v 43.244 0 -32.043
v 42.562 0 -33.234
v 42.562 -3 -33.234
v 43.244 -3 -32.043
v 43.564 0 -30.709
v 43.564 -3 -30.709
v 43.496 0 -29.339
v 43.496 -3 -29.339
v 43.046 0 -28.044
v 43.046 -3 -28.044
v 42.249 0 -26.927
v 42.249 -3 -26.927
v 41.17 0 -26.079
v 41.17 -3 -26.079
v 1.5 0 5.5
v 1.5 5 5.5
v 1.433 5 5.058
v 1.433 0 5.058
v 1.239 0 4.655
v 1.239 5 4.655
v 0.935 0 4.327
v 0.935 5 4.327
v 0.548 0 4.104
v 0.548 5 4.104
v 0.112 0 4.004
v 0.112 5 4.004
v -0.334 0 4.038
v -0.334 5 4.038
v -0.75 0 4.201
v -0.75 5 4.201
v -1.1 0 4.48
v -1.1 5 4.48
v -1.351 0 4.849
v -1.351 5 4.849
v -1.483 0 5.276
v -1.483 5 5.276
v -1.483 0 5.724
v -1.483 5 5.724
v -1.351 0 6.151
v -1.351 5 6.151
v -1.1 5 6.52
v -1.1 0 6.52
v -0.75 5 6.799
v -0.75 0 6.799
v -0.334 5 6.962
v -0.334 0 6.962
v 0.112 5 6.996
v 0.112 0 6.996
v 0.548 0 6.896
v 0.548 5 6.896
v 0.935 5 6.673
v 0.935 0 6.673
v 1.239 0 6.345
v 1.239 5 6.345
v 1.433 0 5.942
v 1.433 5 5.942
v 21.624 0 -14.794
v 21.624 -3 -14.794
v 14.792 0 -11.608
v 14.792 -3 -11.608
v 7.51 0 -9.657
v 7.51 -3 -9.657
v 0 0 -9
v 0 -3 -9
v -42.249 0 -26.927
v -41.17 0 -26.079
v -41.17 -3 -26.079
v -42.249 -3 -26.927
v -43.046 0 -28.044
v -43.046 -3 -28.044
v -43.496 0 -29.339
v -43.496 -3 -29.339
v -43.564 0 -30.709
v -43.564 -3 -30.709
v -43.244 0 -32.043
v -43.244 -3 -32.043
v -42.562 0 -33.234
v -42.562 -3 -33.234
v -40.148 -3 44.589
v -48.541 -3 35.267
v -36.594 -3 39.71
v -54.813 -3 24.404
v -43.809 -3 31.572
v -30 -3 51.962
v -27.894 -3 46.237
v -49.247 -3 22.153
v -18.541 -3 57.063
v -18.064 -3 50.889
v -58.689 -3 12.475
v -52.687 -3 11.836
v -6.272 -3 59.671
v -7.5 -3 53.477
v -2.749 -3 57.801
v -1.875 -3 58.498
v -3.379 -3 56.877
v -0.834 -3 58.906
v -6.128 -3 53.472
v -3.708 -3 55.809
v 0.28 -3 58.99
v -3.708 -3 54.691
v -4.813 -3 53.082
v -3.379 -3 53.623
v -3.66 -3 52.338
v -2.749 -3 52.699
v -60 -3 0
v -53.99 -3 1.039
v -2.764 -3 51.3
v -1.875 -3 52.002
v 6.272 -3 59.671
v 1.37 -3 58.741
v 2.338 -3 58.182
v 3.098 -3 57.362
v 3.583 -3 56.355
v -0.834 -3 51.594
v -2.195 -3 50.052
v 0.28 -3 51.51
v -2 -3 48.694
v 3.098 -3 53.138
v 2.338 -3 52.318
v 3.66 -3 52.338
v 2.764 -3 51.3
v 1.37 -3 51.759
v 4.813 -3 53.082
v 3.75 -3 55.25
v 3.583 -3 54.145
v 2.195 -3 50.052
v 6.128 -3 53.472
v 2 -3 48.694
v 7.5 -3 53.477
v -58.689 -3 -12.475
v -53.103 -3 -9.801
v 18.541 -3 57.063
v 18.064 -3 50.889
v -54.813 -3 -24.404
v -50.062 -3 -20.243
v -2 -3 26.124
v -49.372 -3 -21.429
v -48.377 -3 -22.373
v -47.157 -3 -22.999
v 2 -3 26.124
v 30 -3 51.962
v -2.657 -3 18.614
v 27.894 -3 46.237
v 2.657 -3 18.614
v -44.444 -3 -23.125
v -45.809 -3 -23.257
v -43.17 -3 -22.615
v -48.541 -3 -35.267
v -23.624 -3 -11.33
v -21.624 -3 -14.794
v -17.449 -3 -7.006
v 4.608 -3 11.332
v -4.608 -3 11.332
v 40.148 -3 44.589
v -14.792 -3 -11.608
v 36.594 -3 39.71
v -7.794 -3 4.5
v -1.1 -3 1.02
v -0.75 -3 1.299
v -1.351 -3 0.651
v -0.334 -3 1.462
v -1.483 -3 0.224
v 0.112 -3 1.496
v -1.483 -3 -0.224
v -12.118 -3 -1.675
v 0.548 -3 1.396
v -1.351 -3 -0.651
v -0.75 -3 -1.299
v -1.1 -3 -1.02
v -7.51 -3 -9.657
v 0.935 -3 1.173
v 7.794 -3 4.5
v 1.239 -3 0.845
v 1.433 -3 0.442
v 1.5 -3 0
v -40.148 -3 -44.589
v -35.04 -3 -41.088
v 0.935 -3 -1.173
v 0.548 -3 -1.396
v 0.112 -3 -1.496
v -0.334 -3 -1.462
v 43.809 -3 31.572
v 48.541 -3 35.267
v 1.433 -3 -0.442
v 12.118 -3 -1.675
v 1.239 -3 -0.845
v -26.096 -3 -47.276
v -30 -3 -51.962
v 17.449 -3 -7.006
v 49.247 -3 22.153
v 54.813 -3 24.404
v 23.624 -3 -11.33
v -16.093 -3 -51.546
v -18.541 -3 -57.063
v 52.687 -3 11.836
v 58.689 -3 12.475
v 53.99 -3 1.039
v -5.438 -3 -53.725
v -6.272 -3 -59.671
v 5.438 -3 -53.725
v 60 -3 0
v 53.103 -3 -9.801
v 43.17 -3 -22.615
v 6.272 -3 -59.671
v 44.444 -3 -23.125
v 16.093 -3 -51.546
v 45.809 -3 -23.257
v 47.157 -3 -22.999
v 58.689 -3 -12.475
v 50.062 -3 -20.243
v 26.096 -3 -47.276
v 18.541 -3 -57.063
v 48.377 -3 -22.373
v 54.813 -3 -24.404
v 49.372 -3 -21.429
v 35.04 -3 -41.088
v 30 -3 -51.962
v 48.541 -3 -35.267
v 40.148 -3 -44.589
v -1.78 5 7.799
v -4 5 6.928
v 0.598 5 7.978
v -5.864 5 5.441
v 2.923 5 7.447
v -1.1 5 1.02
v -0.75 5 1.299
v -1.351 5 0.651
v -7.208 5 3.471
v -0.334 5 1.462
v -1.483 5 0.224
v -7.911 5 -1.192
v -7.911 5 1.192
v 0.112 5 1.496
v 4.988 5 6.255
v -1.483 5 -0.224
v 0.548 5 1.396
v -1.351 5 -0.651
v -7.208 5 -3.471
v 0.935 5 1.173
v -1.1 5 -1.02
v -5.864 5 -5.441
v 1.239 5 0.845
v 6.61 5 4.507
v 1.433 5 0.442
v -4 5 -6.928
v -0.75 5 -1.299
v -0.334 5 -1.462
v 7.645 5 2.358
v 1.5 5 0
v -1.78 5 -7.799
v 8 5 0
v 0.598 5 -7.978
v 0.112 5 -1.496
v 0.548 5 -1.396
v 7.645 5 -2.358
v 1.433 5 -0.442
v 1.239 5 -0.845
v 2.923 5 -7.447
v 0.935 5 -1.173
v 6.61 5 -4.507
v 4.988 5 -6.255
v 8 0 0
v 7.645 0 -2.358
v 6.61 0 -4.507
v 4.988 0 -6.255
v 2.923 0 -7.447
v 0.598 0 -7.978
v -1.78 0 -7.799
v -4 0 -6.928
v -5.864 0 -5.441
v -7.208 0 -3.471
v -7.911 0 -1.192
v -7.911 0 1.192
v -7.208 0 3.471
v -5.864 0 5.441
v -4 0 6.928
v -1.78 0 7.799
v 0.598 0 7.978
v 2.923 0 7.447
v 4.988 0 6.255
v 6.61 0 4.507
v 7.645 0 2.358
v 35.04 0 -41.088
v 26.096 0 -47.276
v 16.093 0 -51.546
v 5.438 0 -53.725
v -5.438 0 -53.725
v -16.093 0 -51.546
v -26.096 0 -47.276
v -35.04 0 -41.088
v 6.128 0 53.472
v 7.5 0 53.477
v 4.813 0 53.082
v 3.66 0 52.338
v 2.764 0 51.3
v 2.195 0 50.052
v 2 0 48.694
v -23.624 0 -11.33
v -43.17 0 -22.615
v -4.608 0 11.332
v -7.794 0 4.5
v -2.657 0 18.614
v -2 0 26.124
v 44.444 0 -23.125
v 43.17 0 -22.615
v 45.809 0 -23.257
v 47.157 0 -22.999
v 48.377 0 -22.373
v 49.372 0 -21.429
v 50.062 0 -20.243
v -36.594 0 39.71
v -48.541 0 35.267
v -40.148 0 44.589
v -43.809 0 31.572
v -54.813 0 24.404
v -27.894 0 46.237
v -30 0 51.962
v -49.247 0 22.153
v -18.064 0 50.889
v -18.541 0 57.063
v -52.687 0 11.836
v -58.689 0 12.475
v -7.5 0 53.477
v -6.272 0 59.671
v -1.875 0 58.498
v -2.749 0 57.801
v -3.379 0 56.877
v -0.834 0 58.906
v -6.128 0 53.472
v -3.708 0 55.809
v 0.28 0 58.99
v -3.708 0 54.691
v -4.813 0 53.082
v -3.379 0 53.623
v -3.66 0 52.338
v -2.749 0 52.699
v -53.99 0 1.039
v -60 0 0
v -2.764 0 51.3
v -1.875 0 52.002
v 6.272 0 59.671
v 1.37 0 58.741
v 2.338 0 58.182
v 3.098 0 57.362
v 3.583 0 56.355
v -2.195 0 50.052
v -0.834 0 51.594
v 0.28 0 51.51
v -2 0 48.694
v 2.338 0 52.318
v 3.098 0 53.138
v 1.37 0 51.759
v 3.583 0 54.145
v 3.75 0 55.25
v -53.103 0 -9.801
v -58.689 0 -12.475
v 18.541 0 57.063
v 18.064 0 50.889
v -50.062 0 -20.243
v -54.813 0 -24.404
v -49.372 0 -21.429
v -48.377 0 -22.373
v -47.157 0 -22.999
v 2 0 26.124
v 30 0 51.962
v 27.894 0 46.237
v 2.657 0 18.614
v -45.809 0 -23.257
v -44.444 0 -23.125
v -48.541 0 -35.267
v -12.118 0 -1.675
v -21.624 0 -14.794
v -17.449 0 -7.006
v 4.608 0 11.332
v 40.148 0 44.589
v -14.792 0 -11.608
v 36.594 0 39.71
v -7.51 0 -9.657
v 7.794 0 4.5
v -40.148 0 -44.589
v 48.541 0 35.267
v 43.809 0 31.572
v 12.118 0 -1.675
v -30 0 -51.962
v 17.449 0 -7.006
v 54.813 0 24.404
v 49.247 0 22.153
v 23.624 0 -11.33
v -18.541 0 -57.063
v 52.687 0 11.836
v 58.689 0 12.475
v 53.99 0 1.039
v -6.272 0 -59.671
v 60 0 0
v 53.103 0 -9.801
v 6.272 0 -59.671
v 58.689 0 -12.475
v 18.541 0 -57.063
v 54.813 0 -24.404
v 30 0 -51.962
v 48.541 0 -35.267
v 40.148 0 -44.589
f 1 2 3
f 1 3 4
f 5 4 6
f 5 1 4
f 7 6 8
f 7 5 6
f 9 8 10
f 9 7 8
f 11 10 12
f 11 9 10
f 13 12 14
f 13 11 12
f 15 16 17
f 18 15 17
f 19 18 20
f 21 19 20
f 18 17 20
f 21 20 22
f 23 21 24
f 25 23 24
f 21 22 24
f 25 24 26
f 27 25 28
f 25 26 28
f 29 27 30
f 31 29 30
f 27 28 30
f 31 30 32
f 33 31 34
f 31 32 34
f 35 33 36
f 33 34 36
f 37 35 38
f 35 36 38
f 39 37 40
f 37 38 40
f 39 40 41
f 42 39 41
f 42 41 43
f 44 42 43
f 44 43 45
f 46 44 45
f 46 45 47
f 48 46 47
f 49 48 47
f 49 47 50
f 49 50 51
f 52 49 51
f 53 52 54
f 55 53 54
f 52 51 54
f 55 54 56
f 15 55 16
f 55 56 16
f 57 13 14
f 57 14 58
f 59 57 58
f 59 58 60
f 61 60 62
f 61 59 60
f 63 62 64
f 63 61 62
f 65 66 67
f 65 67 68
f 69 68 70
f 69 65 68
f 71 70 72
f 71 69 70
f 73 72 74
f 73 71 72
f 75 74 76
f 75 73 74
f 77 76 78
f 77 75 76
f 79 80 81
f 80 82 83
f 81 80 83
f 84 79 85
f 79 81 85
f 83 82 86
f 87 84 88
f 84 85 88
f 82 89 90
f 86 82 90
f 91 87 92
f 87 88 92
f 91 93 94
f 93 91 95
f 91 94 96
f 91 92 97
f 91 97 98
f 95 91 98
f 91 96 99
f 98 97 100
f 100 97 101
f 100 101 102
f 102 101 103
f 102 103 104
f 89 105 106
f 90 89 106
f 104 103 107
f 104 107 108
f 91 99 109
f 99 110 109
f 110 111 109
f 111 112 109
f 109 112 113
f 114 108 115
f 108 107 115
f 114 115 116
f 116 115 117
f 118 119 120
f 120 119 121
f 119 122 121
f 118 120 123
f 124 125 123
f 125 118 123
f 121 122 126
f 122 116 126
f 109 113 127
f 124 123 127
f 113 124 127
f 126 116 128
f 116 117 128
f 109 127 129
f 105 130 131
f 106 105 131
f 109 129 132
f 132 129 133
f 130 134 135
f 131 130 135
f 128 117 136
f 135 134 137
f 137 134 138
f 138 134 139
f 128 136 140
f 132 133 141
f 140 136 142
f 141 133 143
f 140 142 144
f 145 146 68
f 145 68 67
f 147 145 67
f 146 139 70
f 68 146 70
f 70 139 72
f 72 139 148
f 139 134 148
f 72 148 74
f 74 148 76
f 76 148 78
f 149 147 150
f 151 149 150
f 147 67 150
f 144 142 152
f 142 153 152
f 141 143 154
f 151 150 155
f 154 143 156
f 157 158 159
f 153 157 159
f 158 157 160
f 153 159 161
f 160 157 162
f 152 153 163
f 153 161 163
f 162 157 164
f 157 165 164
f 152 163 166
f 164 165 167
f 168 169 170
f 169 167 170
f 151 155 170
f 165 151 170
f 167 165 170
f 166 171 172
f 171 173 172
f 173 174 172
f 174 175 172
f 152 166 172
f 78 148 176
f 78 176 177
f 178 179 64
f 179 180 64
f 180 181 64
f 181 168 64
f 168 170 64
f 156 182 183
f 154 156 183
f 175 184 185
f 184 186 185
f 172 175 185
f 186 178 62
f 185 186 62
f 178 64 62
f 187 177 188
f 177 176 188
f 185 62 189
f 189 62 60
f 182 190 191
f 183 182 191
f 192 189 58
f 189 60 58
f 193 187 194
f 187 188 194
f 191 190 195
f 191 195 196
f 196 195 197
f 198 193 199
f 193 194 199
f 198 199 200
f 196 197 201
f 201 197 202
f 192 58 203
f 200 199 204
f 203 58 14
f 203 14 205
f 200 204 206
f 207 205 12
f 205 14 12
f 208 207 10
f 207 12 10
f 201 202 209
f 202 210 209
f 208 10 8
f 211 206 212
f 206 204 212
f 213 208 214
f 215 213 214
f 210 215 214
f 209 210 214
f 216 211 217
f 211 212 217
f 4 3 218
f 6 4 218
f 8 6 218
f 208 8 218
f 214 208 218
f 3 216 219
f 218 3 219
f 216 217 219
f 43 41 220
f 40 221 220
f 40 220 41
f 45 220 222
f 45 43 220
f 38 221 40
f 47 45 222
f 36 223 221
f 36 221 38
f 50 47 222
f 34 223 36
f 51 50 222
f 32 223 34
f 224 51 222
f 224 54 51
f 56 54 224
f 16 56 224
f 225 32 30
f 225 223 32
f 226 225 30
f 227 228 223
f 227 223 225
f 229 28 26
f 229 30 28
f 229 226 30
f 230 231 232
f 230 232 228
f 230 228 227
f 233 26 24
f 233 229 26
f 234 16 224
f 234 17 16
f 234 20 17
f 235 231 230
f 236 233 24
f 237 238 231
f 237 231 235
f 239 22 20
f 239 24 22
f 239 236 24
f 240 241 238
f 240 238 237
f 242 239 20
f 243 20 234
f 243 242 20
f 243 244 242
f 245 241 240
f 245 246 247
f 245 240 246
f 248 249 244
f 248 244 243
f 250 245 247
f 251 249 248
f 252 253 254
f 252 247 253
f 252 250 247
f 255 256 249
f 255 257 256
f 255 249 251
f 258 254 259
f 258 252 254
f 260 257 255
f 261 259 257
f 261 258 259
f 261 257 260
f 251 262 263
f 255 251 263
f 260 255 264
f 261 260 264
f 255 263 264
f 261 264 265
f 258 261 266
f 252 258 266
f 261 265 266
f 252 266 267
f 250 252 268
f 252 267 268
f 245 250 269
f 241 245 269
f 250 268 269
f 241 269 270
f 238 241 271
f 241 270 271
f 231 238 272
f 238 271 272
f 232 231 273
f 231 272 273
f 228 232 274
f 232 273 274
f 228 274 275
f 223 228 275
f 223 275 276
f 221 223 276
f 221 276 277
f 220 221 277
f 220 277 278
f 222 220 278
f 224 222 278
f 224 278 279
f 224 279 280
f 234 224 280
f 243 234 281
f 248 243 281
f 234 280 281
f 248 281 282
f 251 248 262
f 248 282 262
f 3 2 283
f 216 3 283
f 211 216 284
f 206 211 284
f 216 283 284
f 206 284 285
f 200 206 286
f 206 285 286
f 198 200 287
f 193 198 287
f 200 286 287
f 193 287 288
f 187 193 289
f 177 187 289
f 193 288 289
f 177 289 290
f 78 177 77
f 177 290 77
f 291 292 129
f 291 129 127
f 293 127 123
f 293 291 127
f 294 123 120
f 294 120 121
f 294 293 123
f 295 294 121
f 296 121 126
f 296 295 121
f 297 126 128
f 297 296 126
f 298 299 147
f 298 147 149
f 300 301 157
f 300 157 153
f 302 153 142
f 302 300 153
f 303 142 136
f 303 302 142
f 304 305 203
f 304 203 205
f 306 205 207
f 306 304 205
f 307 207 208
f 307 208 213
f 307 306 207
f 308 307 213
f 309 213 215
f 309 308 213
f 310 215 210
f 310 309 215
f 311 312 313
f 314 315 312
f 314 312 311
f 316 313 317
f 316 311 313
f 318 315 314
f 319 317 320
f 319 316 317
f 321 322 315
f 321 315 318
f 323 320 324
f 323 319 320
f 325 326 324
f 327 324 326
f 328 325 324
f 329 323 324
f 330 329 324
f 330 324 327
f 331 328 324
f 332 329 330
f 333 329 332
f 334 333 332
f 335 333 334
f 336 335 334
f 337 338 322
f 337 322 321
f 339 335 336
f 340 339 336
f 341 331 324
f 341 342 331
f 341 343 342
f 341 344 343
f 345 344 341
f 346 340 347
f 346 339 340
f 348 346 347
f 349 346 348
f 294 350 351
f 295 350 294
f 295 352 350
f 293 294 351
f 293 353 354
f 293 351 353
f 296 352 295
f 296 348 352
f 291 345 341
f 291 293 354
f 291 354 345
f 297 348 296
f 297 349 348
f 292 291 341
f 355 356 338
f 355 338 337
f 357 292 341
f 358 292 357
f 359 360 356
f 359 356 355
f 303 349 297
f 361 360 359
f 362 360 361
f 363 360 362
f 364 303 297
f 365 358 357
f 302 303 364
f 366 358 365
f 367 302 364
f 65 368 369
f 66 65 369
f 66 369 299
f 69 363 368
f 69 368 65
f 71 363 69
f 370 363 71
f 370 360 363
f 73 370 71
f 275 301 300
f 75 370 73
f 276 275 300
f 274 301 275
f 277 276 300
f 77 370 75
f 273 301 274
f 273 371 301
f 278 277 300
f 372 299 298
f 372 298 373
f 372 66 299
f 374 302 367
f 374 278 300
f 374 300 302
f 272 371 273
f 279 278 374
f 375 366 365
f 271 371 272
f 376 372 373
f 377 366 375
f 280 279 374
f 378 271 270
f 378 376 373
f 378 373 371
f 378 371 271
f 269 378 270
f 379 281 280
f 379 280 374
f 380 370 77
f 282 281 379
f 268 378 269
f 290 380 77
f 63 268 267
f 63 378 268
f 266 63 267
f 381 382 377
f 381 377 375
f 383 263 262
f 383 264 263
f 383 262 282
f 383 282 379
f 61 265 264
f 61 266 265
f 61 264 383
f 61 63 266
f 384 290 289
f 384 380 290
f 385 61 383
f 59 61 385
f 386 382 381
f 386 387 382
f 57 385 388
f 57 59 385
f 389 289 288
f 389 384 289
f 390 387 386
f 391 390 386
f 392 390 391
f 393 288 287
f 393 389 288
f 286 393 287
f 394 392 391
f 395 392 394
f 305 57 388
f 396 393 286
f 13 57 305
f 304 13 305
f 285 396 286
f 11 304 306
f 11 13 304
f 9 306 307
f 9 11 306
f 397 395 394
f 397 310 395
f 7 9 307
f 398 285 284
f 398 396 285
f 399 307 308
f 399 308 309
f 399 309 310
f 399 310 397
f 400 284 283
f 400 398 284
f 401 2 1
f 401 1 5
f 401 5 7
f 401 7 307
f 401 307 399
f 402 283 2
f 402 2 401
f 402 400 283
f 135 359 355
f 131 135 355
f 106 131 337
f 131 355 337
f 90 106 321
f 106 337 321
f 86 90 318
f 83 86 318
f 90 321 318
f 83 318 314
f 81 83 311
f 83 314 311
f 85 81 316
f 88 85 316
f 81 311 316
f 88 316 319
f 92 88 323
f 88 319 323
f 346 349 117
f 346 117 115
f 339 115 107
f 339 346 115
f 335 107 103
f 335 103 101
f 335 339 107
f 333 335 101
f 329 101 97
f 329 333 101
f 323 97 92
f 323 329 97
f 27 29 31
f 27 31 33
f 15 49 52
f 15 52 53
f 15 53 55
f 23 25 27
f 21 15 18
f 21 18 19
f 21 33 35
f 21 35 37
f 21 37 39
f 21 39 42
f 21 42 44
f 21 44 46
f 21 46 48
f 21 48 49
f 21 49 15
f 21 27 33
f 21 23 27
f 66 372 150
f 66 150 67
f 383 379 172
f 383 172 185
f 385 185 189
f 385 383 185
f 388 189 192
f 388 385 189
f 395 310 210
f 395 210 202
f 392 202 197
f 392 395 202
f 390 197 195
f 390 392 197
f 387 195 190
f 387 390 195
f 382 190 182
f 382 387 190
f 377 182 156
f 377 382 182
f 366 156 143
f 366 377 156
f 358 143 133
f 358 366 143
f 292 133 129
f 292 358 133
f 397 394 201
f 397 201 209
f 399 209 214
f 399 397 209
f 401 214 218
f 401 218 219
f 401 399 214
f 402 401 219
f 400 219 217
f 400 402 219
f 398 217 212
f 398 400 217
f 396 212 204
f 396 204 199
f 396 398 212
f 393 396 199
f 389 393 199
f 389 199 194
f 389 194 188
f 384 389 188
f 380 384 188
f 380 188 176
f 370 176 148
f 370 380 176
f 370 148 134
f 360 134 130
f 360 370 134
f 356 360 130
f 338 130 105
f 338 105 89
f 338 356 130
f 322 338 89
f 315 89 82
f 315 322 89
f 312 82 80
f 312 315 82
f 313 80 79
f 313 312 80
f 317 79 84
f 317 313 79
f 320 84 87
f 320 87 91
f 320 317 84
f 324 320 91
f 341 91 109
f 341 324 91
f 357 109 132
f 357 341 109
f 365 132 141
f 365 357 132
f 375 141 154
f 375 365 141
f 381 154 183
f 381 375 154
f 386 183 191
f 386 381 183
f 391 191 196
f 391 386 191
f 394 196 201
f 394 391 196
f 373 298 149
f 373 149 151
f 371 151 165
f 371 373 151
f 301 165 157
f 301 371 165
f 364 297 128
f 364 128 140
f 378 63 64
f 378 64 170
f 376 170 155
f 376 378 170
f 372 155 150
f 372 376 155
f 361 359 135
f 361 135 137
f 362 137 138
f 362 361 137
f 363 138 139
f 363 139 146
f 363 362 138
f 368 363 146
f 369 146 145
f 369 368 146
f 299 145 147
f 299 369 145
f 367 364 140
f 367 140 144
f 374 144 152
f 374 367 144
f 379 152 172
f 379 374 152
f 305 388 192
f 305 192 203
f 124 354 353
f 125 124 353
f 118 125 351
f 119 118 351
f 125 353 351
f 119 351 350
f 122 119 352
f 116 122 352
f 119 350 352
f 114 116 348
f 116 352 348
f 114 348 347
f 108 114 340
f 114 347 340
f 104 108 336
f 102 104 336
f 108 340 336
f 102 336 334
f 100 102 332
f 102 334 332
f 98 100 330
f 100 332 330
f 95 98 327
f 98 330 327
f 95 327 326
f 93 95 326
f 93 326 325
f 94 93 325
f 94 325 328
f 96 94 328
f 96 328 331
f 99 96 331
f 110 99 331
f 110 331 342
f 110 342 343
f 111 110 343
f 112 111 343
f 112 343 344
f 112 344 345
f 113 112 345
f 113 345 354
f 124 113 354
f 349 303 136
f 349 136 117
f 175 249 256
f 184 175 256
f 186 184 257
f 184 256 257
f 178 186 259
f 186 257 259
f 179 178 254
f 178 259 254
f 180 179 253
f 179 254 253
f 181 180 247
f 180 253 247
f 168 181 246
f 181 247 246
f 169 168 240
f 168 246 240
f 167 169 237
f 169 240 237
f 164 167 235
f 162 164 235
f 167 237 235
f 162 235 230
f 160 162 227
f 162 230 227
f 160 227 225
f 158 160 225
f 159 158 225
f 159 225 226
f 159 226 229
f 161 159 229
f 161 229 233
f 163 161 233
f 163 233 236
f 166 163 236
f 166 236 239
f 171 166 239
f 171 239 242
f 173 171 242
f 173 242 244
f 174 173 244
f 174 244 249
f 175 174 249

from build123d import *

# Parameters (mm, degrees)
SKETCH1_R           = 60
SKETCH1_R_2         = 54
SKETCH1_R_3         = 8
BOSS_EXTRUDE1_DEPTH = 3
SKETCH1_3_R         = 8
BOSS_EXTRUDE2_DEPTH = 5
CUT_EXTRUDE1_REACH  = 10
SKETCH2_R           = 1.5
CUT_EXTRUDE2_REACH  = 5
SKETCH3_R           = 3.75
SKETCH4_R           = 1.5
CUT_EXTRUDE3_DEPTH  = 5


with BuildPart() as part:
    # Sketch1 → Boss-Extrude1 (new body)
    with BuildSketch(Plane(origin=(0, 0, 0), x_dir=(1, 0, 0), z_dir=(0, 1, 0))):
        Circle(SKETCH1_R)
        Circle(SKETCH1_R_2, mode=Mode.SUBTRACT)
        with BuildLine():
            ThreePointArc((7.5, -53.47663041), (3.660460389, -52.338407931), (2.000000204, -48.694167705))
            Line((2.000000204, -48.694167705), (2.000000204, -26.12435489))
            ThreePointArc((2.000000204, -26.12435489), (3.473664254, -14.930765123), (7.794228634, -4.5))
            ThreePointArc((7.794228634, -4.5), (14.667254021, 4.457101073), (23.624355095, 11.33012646))
            Line((23.624355095, 11.33012646), (43.170386351, 22.615032868))
            ThreePointArc((43.170386351, 22.615032868), (47.156621056, 22.999152279), (50.062120444, 20.243124677))
            ThreePointArc((50.062120444, 20.243124677), (46.765371804, 27), (42.562120444, 33.233505733))
            ThreePointArc((42.562120444, 33.233505733), (43.496160667, 29.339255651), (41.170386147, 26.079134837))
            Line((41.170386147, 26.079134837), (21.62435489, 14.79422843))
            ThreePointArc((21.62435489, 14.79422843), (11.193589767, 10.47366405), (0, 9))
            ThreePointArc((0, 9), (-11.193589767, 10.47366405), (-21.62435489, 14.79422843))
            Line((-21.62435489, 14.79422843), (-41.170386147, 26.079134837))
            ThreePointArc((-41.170386147, 26.079134837), (-43.496160667, 29.339255651), (-42.562120444, 33.233505733))
            ThreePointArc((-42.562120444, 33.233505733), (-46.765371804, 27), (-50.062120444, 20.243124677))
            ThreePointArc((-50.062120444, 20.243124677), (-47.156621056, 22.999152279), (-43.170386351, 22.615032868))
            Line((-43.170386351, 22.615032868), (-23.624355095, 11.33012646))
            ThreePointArc((-23.624355095, 11.33012646), (-14.667254021, 4.457101073), (-7.794228634, -4.5))
            ThreePointArc((-7.794228634, -4.5), (-3.473664254, -14.930765123), (-2.000000204, -26.12435489))
            Line((-2.000000204, -26.12435489), (-2.000000204, -48.694167705))
            ThreePointArc((-2.000000204, -48.694167705), (-3.660460389, -52.338407931), (-7.5, -53.47663041))
            ThreePointArc((-7.5, -53.47663041), (0, -54), (7.5, -53.47663041))
        make_face()
        Circle(SKETCH1_R_3, mode=Mode.SUBTRACT)
        Circle(SKETCH1_R_3)
    extrude(amount=-BOSS_EXTRUDE1_DEPTH)

    # Sketch1_3 → Boss-Extrude2 (add)
    with BuildSketch(Plane(origin=(0, 0, 0), x_dir=(1, 0, 0), z_dir=(0, 1, 0))):
        Circle(SKETCH1_3_R)
    extrude(amount=BOSS_EXTRUDE2_DEPTH)

    # Sketch2 → Cut-Extrude1 (cut, up to next)
    with BuildSketch(Plane(origin=(0, 5, 0), x_dir=(1, 0, 0), z_dir=(0, 1, 0)), mode=Mode.PRIVATE) as cut_extrude1_sk1:
        Circle(SKETCH2_R)
    cut_extrude1_tool1 = extrude(cut_extrude1_sk1.sketch, amount=-CUT_EXTRUDE1_REACH, mode=Mode.PRIVATE) & part.part
    add(cut_extrude1_tool1.solids().sort_by_distance((0, 5, 0))[0], mode=Mode.SUBTRACT)

    # Sketch3 → Cut-Extrude2 (cut, up to next)
    with BuildSketch(Plane(origin=(0, 0, 0), x_dir=(1, 0, 0), z_dir=(0, 1, 0)), mode=Mode.PRIVATE) as cut_extrude2_sk1:
        with Locations((0, -55.25)):
            Circle(SKETCH3_R)
    cut_extrude2_tool1 = extrude(cut_extrude2_sk1.sketch, amount=-CUT_EXTRUDE2_REACH, mode=Mode.PRIVATE) & part.part
    add(cut_extrude2_tool1.solids().sort_by_distance((0, 0, 55.25))[0], mode=Mode.SUBTRACT)

    # Sketch4 → Cut-Extrude3 (cut)
    with BuildSketch(Plane(origin=(0, 5, 0), x_dir=(1, 0, 0), z_dir=(0, 1, 0))):
        with Locations((0, -5.5)):
            Circle(SKETCH4_R)
    extrude(amount=-CUT_EXTRUDE3_DEPTH, mode=Mode.SUBTRACT)


solid = part.part
